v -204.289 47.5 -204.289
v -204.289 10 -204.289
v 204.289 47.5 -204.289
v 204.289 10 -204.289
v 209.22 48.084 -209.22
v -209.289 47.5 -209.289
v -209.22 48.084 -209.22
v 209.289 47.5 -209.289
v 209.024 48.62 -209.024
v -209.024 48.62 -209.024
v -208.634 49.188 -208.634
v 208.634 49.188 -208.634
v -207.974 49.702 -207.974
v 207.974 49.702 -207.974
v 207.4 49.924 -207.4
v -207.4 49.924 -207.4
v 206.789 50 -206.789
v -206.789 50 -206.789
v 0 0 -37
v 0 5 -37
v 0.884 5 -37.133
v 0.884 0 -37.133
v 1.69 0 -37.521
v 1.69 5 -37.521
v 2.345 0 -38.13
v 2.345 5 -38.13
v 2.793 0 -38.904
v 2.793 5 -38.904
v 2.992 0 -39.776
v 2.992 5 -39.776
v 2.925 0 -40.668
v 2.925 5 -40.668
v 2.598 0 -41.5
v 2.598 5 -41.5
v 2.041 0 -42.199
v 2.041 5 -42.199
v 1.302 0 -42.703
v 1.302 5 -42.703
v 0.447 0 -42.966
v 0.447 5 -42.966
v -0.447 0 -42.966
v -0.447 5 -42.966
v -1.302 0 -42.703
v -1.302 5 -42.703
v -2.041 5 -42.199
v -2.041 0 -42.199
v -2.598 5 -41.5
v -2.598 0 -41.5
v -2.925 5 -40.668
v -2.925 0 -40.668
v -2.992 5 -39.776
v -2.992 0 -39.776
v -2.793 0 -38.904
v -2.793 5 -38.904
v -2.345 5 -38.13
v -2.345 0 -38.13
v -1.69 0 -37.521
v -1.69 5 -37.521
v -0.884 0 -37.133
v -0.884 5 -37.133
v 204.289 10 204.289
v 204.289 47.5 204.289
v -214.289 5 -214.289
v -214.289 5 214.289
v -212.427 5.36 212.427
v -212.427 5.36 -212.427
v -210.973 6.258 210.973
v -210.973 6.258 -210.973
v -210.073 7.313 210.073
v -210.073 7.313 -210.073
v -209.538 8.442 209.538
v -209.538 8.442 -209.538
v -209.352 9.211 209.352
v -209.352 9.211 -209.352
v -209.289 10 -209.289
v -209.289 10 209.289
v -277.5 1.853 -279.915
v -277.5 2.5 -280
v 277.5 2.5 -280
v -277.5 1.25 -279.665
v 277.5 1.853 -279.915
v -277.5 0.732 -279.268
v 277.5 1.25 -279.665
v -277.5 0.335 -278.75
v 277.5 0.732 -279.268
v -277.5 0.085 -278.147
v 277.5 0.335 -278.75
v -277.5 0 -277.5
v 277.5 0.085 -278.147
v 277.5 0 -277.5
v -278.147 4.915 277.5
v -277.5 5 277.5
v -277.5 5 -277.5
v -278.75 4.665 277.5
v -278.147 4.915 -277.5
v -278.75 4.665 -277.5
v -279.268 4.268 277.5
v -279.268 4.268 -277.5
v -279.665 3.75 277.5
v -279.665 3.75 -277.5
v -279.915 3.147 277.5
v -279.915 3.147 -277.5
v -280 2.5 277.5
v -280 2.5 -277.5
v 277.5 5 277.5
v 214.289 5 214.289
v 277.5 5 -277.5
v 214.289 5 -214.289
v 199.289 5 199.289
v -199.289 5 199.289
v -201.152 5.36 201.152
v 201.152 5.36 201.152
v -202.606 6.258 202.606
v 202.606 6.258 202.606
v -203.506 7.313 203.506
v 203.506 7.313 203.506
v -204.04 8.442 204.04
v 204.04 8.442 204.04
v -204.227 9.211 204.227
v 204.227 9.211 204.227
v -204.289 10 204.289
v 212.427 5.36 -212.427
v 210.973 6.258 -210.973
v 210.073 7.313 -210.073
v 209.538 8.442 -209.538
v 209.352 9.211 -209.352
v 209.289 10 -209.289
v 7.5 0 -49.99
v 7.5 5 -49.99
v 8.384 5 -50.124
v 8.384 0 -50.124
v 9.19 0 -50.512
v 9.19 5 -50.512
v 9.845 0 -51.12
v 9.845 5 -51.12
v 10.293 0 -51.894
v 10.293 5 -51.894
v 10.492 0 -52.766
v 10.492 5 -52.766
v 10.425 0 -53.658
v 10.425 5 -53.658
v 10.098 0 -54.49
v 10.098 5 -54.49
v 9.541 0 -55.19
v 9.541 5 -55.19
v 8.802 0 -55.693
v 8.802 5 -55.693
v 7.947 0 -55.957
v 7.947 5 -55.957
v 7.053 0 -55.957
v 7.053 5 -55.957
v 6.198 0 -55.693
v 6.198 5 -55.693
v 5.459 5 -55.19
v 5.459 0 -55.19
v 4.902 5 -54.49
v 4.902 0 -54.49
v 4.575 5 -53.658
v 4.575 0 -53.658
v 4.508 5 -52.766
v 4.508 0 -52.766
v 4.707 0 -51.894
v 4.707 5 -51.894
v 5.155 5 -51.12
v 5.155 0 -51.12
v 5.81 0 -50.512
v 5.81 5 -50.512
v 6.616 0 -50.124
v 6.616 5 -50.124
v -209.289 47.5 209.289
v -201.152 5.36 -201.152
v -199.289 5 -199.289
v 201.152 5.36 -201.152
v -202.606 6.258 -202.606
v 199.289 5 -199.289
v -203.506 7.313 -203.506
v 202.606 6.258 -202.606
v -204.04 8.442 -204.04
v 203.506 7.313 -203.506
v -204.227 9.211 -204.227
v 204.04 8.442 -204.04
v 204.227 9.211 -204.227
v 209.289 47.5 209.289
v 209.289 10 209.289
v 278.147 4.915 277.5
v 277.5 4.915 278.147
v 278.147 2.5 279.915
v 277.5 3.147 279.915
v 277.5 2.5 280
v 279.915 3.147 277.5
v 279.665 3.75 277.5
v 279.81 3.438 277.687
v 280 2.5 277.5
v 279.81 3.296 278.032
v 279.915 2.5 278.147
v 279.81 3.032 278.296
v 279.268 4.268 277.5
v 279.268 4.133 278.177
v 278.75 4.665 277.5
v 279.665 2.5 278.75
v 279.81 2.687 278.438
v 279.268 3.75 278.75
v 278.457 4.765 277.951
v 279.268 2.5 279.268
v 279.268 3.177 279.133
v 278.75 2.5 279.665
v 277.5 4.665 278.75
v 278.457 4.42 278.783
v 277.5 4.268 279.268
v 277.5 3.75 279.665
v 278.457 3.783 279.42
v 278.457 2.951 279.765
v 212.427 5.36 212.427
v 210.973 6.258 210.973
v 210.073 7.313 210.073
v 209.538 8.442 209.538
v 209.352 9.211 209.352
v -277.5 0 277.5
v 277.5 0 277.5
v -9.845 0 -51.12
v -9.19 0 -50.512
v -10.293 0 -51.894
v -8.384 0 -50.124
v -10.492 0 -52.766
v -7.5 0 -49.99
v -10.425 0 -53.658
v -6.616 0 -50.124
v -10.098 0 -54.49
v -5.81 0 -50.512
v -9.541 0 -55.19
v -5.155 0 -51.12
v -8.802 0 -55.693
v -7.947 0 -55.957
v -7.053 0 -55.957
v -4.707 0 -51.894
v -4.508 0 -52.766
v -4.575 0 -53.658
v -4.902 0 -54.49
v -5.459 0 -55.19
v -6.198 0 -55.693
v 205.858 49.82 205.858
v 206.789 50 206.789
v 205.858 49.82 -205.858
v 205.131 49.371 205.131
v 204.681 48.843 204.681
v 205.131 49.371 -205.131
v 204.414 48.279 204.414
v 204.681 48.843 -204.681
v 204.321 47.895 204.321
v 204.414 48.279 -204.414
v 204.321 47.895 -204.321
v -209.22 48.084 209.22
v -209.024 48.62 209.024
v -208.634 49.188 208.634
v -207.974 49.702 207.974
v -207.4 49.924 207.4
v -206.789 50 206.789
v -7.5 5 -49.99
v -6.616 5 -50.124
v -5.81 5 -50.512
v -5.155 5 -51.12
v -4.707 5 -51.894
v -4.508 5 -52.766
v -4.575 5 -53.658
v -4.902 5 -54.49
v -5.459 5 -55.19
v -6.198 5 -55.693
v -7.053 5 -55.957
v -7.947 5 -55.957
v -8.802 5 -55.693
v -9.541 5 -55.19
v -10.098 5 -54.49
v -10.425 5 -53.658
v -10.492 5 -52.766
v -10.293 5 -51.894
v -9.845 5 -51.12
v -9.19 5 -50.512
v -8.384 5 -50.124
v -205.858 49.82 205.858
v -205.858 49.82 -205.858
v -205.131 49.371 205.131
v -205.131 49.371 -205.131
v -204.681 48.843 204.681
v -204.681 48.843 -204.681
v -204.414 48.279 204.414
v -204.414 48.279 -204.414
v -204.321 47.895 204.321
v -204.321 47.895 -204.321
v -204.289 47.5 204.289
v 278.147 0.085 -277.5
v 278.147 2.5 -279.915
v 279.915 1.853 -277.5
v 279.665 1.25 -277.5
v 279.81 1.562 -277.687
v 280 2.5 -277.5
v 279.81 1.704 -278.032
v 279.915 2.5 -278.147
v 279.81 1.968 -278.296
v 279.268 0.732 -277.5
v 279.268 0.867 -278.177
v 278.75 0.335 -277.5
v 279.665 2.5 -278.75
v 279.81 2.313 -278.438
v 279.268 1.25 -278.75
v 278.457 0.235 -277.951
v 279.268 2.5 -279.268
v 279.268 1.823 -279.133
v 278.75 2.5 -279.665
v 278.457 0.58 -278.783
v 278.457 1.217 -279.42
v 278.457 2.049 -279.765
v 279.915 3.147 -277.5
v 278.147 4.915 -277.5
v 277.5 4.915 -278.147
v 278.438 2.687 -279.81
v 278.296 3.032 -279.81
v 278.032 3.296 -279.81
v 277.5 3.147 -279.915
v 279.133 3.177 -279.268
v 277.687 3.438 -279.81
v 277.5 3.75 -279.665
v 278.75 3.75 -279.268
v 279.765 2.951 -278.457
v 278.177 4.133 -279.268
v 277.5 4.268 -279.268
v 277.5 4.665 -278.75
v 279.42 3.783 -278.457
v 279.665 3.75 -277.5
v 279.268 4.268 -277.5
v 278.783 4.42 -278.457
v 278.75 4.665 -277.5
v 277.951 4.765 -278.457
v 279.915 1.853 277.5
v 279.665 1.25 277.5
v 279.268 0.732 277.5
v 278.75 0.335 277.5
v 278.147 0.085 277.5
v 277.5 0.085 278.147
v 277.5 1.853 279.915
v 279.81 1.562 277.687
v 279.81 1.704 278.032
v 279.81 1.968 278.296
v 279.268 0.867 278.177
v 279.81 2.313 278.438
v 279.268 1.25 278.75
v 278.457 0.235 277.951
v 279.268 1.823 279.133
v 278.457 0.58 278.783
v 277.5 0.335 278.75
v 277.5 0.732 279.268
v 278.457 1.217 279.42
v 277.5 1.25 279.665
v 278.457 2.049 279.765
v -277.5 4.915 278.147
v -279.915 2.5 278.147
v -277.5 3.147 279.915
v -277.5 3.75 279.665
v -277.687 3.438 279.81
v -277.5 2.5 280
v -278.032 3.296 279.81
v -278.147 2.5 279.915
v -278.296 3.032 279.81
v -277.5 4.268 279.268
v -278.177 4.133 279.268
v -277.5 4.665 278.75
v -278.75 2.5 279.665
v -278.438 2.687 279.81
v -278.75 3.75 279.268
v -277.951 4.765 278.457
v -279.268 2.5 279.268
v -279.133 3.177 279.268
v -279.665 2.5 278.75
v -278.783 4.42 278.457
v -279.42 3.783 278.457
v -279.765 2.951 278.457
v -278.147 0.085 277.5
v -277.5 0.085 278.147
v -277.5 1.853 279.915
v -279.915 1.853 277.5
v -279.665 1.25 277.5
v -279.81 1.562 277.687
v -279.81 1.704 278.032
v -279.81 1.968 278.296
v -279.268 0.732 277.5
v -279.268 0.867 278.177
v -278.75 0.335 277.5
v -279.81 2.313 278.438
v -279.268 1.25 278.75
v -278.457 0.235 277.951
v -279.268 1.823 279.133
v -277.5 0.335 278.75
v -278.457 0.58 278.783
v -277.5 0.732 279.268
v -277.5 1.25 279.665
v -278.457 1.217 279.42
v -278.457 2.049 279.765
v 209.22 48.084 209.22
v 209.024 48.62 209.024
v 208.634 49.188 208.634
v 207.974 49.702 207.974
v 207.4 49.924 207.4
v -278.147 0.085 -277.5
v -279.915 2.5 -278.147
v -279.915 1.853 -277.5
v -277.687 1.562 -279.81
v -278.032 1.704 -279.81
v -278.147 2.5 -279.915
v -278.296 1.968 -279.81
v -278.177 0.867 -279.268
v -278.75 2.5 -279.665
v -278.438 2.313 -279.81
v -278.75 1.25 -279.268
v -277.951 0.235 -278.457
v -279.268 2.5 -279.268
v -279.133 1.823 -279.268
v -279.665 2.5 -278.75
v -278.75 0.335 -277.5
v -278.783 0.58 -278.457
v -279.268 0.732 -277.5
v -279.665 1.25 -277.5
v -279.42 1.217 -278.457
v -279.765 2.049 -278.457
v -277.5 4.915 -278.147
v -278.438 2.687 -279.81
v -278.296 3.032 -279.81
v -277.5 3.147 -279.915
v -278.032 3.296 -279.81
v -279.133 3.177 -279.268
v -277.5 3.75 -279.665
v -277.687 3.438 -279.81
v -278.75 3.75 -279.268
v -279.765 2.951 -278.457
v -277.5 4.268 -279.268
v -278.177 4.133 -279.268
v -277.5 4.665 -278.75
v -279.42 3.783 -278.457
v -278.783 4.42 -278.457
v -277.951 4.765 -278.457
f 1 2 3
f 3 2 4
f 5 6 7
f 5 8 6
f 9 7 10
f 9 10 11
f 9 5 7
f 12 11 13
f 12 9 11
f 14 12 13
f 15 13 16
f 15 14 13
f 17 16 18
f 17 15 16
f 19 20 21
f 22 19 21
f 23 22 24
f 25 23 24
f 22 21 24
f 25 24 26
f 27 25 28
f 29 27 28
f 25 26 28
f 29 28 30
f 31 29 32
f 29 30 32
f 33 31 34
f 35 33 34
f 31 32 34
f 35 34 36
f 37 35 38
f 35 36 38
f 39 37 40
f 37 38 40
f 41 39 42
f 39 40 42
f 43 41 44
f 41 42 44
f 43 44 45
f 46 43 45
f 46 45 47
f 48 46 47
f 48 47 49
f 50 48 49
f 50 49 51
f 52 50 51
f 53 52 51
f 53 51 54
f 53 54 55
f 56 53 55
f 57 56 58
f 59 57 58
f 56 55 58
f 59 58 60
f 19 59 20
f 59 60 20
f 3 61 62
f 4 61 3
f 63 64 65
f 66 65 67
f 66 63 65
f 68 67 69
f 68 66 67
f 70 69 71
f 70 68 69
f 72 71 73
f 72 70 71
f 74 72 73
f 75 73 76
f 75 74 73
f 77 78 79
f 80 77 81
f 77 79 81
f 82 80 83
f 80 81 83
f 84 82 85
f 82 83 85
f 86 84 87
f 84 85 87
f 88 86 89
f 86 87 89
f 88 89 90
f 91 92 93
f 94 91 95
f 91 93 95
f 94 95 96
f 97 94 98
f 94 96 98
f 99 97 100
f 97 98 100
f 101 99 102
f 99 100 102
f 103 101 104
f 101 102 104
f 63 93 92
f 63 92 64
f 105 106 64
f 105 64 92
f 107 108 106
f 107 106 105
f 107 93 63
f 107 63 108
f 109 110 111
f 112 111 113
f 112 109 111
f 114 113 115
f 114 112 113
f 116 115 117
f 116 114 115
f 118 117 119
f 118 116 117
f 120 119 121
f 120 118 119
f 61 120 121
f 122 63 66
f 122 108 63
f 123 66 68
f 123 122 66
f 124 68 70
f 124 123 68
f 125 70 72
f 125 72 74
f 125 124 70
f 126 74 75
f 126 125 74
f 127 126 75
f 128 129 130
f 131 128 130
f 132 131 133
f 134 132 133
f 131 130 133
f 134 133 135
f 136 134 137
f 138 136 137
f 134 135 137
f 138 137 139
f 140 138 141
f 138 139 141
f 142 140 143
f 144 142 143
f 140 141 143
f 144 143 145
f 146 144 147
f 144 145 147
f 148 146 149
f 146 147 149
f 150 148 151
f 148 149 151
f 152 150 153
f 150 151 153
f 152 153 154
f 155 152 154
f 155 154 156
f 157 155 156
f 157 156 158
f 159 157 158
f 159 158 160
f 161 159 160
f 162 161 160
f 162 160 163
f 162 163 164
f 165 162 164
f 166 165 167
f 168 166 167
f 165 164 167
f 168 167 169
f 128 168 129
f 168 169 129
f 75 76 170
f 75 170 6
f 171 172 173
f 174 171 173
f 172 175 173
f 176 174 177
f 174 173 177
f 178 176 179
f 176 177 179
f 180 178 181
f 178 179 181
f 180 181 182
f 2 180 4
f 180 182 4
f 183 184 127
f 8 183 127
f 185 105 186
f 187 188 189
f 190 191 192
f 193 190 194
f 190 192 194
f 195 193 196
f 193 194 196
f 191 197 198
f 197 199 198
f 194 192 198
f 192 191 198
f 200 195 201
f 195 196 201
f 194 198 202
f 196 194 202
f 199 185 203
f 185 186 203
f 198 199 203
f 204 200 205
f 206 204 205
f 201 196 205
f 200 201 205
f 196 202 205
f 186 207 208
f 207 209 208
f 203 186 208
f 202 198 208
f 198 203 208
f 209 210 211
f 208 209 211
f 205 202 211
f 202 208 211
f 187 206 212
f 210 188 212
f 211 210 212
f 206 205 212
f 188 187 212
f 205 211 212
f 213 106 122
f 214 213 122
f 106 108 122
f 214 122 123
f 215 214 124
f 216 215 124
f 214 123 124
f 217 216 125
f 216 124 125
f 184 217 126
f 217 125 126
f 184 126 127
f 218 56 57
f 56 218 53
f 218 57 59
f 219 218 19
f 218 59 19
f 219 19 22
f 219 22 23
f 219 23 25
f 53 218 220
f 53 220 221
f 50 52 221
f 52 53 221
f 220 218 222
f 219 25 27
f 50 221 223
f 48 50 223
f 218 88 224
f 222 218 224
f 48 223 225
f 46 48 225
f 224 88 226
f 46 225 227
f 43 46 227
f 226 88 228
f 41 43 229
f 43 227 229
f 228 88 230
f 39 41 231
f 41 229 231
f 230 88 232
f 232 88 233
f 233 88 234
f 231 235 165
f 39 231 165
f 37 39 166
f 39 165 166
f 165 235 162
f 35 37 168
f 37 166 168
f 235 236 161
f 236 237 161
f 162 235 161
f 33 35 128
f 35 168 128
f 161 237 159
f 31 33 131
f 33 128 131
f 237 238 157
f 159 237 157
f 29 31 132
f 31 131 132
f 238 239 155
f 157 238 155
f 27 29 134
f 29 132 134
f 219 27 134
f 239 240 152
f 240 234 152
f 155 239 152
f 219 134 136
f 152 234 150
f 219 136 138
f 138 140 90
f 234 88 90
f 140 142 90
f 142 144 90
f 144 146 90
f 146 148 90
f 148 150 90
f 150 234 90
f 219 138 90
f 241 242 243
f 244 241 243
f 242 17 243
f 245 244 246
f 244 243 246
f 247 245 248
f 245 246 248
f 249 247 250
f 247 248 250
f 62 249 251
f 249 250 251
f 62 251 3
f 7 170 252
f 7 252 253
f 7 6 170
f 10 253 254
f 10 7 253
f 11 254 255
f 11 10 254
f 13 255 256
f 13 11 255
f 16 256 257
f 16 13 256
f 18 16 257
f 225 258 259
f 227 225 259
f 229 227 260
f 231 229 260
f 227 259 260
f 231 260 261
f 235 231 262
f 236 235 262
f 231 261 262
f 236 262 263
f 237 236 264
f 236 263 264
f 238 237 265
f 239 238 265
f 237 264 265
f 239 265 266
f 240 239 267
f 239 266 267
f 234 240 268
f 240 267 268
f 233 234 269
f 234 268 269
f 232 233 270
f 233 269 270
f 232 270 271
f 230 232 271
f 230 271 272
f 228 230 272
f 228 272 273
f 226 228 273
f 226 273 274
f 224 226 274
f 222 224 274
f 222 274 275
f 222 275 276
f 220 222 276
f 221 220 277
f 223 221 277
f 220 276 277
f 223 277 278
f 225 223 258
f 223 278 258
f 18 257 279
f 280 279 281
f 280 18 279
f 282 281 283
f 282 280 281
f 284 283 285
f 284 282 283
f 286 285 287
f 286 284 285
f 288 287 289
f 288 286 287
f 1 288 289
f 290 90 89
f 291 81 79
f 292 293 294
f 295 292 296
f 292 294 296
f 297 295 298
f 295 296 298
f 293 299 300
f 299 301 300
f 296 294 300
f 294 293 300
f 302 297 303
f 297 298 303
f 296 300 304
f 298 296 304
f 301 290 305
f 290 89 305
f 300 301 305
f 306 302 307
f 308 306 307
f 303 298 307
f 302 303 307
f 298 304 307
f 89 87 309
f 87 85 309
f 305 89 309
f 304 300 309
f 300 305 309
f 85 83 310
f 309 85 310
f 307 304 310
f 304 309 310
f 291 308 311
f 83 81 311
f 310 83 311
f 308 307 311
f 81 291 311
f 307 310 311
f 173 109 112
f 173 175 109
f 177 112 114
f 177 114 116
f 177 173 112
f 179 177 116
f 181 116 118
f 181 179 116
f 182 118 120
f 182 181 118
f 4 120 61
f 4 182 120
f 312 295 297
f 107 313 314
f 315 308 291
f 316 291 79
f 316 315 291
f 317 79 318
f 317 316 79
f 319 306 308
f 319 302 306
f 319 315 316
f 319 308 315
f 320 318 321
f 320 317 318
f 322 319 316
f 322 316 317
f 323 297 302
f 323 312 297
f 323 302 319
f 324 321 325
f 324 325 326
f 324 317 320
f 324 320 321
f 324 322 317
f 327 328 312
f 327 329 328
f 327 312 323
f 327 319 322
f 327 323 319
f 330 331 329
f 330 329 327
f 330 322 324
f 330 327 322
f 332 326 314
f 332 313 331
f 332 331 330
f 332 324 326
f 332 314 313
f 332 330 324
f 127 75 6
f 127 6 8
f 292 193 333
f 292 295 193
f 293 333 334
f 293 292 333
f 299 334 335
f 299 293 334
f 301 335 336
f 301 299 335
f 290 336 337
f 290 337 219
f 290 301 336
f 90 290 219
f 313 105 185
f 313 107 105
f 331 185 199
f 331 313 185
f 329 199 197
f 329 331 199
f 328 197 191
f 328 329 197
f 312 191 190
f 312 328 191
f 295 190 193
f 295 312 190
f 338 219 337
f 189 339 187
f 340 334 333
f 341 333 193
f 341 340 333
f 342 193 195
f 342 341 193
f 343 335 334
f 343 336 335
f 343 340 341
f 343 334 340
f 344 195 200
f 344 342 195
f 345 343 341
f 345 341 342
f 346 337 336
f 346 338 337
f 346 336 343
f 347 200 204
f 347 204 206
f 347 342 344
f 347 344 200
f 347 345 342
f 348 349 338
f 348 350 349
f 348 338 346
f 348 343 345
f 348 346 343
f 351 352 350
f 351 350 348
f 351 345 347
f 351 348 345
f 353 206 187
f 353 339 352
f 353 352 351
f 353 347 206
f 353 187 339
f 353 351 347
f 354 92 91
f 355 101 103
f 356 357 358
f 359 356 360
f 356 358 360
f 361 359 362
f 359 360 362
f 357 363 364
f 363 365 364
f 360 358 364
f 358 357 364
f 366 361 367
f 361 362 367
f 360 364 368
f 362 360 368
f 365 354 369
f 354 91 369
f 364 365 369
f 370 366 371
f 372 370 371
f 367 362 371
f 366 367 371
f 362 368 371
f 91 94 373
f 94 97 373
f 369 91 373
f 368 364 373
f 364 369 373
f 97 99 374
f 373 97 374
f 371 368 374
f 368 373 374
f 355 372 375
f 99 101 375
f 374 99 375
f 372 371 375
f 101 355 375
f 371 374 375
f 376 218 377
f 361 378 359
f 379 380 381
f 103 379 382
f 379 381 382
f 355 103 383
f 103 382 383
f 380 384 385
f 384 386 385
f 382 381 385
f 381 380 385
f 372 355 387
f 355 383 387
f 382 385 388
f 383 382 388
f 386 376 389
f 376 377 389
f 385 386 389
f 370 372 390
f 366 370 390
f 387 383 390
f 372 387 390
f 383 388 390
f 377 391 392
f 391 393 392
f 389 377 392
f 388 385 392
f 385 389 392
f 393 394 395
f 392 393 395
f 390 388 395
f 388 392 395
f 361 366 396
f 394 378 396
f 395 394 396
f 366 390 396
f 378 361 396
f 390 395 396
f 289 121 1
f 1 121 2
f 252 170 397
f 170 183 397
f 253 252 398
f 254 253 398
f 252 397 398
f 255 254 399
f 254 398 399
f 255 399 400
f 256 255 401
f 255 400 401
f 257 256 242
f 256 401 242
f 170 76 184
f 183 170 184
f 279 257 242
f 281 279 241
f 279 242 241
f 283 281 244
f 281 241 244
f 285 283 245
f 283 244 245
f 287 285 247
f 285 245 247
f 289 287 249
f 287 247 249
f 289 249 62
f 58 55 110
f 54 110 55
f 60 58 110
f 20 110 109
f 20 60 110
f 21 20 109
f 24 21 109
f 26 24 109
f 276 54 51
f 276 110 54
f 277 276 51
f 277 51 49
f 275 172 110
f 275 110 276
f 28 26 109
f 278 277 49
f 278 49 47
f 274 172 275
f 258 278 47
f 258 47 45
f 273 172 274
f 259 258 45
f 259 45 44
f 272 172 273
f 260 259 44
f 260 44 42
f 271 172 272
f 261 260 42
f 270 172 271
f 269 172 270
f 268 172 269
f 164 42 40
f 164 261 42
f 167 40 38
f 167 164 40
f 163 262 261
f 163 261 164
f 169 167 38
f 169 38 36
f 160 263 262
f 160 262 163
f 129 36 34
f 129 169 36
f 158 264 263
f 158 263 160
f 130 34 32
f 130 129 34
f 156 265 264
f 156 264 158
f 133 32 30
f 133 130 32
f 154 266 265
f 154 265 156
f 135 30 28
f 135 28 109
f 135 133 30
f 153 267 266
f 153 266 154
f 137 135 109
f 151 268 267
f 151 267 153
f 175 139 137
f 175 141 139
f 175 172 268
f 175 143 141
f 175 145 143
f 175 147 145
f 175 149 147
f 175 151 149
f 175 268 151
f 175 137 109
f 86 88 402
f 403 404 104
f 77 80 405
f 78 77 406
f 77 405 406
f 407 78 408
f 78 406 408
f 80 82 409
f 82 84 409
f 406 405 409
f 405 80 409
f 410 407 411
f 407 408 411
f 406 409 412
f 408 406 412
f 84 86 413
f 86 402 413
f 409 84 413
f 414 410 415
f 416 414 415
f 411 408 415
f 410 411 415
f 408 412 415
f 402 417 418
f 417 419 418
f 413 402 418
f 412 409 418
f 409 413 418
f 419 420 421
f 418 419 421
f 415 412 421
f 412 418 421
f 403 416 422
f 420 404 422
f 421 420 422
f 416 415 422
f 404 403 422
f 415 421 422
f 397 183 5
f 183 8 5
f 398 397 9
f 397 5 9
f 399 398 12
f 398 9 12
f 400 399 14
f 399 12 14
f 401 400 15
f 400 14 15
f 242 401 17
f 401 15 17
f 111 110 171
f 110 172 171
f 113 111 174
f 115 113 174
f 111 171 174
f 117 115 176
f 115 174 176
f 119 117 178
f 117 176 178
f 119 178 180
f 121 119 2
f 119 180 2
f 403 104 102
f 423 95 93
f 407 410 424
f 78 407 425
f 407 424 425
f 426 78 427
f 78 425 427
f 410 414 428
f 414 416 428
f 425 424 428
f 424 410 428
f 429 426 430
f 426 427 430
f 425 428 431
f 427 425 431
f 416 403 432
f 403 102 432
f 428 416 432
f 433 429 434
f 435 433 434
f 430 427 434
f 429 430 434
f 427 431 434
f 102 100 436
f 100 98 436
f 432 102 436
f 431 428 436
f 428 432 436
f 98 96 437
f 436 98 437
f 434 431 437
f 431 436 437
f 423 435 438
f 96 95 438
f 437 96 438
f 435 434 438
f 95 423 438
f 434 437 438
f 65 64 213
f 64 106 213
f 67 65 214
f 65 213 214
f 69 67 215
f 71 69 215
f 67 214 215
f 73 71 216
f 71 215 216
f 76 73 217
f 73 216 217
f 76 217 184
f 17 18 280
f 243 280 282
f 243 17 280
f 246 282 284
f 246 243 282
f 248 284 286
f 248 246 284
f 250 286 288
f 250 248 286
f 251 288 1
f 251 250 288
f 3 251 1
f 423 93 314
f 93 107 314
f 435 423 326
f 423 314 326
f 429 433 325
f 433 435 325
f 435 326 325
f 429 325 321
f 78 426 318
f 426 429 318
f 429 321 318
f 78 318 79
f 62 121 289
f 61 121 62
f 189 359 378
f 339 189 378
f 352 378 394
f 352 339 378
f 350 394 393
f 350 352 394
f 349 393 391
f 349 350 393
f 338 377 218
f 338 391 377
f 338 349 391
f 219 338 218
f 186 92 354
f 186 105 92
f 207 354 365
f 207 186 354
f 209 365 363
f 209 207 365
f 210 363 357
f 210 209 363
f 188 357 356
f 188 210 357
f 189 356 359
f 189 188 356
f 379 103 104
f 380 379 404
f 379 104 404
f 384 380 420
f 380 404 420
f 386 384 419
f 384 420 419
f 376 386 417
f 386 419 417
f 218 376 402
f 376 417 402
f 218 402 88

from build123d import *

# Parameters (mm, degrees)
SKETCH1_W           = 560
SKETCH1_H           = 560
BOSS_EXTRUDE1_DEPTH = 5
SKETCH2_W           = 418.578643762
SKETCH2_H           = 418.578643762
SKETCH2_W_2         = 408.578643762
SKETCH2_H_2         = 408.578643762
BOSS_EXTRUDE2_DEPTH = 45
SKETCH3_R           = 3
CUT_EXTRUDE1_DEPTH  = 5
FILLET1_R           = 5
FILLET2_R           = 2.5
FILLET3_R           = 2.5


with BuildPart() as part:
    # Sketch1 → Boss-Extrude1 (new body)
    with BuildSketch(Plane(origin=(0, 0, 0), x_dir=(1, 0, 0), z_dir=(0, 1, 0))):
        Rectangle(SKETCH1_W, SKETCH1_H)
    extrude(amount=BOSS_EXTRUDE1_DEPTH)

    # Sketch2 → Boss-Extrude2 (add)
    with BuildSketch(Plane(origin=(0, 5, 0), x_dir=(1, 0, 0), z_dir=(0, 1, 0))):
        Rectangle(SKETCH2_W, SKETCH2_H)
        Rectangle(SKETCH2_W_2, SKETCH2_H_2, mode=Mode.SUBTRACT)
    extrude(amount=BOSS_EXTRUDE2_DEPTH)

    # Sketch3 → Cut-Extrude1 (cut)
    with BuildSketch(Plane(origin=(0, 5, 0), x_dir=(1, 0, 0), z_dir=(0, 1, 0))):
        with Locations(Location((7.5, 52.990381057, 0), (0, 0, 270))):
            Circle(SKETCH3_R)
        with Locations(Location((0, 40, 0), (0, 0, 270))):
            Circle(SKETCH3_R)
        with Locations(Location((-7.5, 52.990381057, 0), (0, 0, 270))):
            Circle(SKETCH3_R)
    extrude(amount=-CUT_EXTRUDE1_DEPTH, mode=Mode.SUBTRACT)

    # Fillet1
    fillet1_edges = [part.edges().sort_by_distance(p)[0] for p in [
        (0, 5, -204.289321881),
        (204.289321881, 5, 0),
        (-209.289321881, 5, 0),
        (0, 5, 209.289321881),
        (209.289321881, 5, 0),
        (0, 5, -209.289321881),
        (-204.289321881, 5, 0),
        (0, 5, 204.289321881),
    ]]
    fillet(fillet1_edges, radius=FILLET1_R)

    # Fillet2
    fillet2_edges = [part.edges().sort_by_distance(p)[0] for p in [
        (0, 50, 204.289321881),
        (209.289321881, 50, 0),
        (0, 50, -209.289321881),
        (-204.289321881, 50, 0),
        (-209.289321881, 50, 0),
        (0, 50, 209.289321881),
        (0, 50, -204.289321881),
        (204.289321881, 50, 0),
    ]]
    fillet(fillet2_edges, radius=FILLET2_R - 0.0001)  # a hair under: the kernel refuses the full size

    # Fillet3
    fillet3_edges = [part.edges().sort_by_distance(p)[0] for p in [
        (-280, 5, 0),
        (0, 5, 280),
        (280, 5, 0),
        (0, 0, 280),
        (-280, 0, 0),
        (0, 0, -280),
        (280, 0, 0),
        (280, 2.5, 280),
        (-280, 2.5, 280),
        (-280, 2.5, -280),
        (280, 2.5, -280),
        (0, 5, -280),
    ]]
    fillet(fillet3_edges, radius=FILLET3_R - 0.0001)  # a hair under: the kernel refuses the full size


solid = part.part
